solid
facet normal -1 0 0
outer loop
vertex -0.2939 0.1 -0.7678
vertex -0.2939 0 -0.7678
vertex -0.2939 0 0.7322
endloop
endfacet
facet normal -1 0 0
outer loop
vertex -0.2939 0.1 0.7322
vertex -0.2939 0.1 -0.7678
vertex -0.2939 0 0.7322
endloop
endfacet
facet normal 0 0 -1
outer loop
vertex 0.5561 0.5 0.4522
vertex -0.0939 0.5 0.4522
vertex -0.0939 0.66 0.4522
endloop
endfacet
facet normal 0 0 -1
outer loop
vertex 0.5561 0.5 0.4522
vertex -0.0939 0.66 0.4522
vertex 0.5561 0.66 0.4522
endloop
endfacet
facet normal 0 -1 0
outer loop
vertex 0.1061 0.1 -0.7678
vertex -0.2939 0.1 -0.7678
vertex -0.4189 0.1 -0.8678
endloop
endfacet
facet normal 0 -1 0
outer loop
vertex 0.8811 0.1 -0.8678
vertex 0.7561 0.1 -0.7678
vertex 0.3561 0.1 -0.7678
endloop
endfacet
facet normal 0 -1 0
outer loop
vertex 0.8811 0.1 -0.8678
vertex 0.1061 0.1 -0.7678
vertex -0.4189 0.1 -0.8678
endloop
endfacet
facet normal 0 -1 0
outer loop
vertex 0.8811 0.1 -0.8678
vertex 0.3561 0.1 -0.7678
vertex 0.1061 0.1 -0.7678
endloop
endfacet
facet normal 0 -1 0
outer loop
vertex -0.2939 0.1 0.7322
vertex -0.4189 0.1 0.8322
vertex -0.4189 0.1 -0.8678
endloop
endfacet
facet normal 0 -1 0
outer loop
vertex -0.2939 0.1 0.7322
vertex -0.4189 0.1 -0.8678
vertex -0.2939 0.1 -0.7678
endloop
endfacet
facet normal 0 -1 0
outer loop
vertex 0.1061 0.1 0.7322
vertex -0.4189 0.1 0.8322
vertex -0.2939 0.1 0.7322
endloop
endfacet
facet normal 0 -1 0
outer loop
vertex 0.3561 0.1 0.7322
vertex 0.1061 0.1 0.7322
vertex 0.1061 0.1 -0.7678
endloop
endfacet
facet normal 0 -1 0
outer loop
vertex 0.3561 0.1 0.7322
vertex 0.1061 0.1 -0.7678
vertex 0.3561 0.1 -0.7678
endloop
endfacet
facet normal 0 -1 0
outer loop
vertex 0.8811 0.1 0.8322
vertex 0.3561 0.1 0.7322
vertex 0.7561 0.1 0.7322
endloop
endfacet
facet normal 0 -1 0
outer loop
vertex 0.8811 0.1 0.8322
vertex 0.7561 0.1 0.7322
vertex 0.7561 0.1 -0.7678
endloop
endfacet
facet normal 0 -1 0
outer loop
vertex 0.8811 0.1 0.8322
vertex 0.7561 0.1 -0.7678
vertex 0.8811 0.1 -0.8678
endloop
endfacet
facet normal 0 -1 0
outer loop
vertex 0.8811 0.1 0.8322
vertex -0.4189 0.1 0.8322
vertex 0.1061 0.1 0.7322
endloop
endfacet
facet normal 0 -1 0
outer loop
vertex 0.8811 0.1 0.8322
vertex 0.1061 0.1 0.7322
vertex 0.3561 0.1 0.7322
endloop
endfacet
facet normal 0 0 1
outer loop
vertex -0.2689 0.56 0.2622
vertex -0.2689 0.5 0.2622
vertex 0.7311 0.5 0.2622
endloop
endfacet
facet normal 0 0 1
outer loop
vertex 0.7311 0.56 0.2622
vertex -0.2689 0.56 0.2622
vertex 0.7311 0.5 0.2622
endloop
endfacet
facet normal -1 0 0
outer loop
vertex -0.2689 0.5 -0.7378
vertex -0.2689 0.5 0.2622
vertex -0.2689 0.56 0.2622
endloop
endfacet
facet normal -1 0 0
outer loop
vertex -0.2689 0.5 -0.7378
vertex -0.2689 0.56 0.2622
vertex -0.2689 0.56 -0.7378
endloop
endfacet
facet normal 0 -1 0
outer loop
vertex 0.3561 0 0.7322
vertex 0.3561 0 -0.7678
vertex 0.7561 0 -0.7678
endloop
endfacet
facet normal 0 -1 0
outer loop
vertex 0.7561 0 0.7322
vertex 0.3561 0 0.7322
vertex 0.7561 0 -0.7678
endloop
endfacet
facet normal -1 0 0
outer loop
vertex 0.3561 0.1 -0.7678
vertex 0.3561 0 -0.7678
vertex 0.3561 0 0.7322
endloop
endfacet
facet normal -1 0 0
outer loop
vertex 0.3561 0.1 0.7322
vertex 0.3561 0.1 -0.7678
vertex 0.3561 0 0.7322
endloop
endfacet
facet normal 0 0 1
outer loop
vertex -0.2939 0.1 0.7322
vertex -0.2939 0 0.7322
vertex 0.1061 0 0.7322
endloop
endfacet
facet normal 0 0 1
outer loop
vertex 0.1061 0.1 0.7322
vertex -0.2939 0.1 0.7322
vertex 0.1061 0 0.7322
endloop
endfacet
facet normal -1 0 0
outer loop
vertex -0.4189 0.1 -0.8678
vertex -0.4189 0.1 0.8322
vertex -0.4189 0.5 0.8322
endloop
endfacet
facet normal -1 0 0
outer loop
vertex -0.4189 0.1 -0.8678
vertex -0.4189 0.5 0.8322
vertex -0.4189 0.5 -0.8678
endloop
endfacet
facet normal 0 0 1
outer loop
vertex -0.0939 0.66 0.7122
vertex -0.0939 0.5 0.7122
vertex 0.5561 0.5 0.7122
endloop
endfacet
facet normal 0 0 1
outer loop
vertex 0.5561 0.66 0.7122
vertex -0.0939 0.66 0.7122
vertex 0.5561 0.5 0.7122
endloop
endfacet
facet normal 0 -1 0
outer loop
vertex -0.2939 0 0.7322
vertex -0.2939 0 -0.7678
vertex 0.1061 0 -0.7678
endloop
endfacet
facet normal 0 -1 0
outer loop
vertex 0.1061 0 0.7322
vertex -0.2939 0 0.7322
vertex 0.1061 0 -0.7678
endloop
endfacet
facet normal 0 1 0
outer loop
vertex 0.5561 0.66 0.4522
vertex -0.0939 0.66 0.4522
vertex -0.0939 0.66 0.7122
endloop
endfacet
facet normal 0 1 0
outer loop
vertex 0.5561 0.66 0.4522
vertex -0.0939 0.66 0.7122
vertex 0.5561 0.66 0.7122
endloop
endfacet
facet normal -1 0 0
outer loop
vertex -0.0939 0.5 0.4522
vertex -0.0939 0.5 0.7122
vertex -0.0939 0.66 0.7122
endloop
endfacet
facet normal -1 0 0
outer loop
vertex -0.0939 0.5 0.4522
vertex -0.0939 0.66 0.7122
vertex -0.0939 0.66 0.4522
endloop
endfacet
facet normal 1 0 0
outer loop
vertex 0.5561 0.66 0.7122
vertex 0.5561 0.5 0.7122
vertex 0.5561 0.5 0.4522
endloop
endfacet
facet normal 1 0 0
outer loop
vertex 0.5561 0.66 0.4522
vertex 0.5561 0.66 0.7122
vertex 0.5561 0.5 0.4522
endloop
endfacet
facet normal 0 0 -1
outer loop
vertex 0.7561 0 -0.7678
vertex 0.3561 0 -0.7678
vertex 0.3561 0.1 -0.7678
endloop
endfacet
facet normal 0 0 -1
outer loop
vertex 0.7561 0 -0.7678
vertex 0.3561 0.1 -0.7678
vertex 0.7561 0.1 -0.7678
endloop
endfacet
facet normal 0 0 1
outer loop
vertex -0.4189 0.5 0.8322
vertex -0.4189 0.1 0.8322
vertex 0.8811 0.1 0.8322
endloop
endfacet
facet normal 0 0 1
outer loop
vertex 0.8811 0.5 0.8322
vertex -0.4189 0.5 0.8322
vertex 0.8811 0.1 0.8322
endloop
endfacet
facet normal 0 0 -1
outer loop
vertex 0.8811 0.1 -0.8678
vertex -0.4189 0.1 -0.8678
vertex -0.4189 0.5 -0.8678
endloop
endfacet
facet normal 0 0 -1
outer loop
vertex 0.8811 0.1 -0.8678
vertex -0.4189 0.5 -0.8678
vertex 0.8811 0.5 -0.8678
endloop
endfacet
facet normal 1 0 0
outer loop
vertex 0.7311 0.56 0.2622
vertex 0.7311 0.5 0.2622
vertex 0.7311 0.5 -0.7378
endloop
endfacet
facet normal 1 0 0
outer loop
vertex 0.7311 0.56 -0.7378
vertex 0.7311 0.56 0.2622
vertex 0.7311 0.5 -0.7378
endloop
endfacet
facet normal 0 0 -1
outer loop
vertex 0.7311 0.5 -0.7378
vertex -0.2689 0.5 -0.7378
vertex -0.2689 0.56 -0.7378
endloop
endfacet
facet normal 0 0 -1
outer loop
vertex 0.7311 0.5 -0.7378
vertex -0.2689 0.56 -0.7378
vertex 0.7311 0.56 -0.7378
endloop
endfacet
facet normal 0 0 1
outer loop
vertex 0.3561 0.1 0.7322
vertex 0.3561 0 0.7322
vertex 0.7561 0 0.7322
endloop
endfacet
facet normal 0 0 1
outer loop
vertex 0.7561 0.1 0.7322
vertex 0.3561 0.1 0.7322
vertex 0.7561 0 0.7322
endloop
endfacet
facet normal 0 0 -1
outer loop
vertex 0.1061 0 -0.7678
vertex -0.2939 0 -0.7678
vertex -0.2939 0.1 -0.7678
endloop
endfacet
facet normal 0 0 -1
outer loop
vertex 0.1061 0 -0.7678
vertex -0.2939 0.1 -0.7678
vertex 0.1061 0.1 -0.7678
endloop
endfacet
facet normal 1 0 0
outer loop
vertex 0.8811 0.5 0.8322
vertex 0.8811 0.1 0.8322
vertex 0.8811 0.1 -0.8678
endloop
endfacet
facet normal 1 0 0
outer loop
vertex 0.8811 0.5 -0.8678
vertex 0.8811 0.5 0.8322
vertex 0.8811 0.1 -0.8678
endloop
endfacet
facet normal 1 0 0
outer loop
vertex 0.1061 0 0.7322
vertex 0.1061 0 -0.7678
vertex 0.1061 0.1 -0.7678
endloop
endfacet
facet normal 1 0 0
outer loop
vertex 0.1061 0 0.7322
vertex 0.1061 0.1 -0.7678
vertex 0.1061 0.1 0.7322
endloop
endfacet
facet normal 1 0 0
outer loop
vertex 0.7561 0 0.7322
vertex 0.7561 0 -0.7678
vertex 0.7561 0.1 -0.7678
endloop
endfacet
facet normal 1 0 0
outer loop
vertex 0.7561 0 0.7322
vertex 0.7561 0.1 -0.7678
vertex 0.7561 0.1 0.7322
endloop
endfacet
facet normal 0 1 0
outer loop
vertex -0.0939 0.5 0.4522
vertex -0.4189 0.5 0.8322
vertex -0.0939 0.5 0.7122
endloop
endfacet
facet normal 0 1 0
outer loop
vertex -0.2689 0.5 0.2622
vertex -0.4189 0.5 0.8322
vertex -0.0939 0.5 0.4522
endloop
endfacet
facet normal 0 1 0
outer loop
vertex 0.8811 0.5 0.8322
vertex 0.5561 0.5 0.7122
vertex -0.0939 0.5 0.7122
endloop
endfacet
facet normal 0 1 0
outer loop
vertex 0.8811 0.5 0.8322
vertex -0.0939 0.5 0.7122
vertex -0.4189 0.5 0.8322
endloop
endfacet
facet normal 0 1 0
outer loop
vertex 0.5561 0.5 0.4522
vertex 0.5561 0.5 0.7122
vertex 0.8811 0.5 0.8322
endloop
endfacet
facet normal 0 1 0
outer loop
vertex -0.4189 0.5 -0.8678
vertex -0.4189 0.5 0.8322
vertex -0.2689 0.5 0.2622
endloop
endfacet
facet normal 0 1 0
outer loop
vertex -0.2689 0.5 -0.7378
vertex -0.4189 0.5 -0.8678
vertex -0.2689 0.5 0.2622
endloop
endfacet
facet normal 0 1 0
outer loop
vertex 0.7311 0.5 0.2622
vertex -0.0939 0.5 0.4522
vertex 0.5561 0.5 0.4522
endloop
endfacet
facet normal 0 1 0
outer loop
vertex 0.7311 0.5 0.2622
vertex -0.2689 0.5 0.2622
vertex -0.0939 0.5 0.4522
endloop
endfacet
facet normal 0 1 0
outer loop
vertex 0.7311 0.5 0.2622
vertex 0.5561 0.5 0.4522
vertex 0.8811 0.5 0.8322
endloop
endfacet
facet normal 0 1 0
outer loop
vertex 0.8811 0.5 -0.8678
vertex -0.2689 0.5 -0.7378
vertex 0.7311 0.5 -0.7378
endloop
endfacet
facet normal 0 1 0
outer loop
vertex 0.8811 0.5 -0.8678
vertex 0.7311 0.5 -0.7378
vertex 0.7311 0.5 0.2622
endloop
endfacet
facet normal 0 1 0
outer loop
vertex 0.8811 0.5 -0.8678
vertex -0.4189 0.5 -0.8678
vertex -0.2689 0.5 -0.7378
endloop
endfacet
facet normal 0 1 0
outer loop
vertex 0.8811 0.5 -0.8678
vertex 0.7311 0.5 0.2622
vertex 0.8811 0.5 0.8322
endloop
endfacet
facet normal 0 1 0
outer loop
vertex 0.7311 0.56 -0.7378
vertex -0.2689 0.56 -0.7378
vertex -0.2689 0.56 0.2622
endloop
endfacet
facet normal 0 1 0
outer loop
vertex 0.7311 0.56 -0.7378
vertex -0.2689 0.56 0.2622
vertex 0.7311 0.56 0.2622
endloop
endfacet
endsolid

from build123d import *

# Parameters (mm, degrees)
SKETCH1_W           = 1.3
SKETCH1_H           = 1.7
BOSS_EXTRUDE1_DEPTH = 0.5
SKETCH2_W           = 1
SKETCH2_H           = 1
BOSS_EXTRUDE2_DEPTH = 0.06
SKETCH3_W           = 0.65
SKETCH3_H           = 0.26
BOSS_EXTRUDE3_DEPTH = 0.16
SKETCH4_W           = 2.706205425
SKETCH4_H           = 2.549362478
SKETCH4_W_2         = 0.4
SKETCH4_H_2         = 1.5
CUT_EXTRUDE1_DEPTH  = 0.1


with BuildPart() as part:
    # Sketch1 → Boss-Extrude1 (new body)
    with BuildSketch(Plane(origin=(0, 0, 0), x_dir=(1, 0, 0), z_dir=(0, 1, 0))):
        with Locations((0.231074169, 0.017774936)):
            Rectangle(SKETCH1_W, SKETCH1_H)
    extrude(amount=BOSS_EXTRUDE1_DEPTH)

    # Sketch2 → Boss-Extrude2 (add)
    with BuildSketch(Plane(origin=(0, 0.5, 0), x_dir=(1, 0, 0), z_dir=(0, 1, 0))):
        with Locations((0.231074169, 0.237774936)):
            Rectangle(SKETCH2_W, SKETCH2_H)
    extrude(amount=BOSS_EXTRUDE2_DEPTH)

    # Sketch3 → Boss-Extrude3 (add)
    with BuildSketch(Plane(origin=(0, 0.5, 0), x_dir=(1, 0, 0), z_dir=(0, 1, 0))):
        with Locations((0.231074169, -0.582225064)):
            Rectangle(SKETCH3_W, SKETCH3_H)
    extrude(amount=BOSS_EXTRUDE3_DEPTH)

    # Sketch4 → Cut-Extrude1 (cut)
    with BuildSketch(Plane.XZ):
        with Locations((0.454375992, -0.066954504)):
            Rectangle(SKETCH4_W, SKETCH4_H)
        with Locations((-0.093925831, -0.017774936)):
            Rectangle(SKETCH4_W_2, SKETCH4_H_2, mode=Mode.SUBTRACT)
        with Locations((0.556074169, -0.017774936)):
            Rectangle(SKETCH4_W_2, SKETCH4_H_2, mode=Mode.SUBTRACT)
    extrude(amount=-CUT_EXTRUDE1_DEPTH, mode=Mode.SUBTRACT)


solid = part.part
